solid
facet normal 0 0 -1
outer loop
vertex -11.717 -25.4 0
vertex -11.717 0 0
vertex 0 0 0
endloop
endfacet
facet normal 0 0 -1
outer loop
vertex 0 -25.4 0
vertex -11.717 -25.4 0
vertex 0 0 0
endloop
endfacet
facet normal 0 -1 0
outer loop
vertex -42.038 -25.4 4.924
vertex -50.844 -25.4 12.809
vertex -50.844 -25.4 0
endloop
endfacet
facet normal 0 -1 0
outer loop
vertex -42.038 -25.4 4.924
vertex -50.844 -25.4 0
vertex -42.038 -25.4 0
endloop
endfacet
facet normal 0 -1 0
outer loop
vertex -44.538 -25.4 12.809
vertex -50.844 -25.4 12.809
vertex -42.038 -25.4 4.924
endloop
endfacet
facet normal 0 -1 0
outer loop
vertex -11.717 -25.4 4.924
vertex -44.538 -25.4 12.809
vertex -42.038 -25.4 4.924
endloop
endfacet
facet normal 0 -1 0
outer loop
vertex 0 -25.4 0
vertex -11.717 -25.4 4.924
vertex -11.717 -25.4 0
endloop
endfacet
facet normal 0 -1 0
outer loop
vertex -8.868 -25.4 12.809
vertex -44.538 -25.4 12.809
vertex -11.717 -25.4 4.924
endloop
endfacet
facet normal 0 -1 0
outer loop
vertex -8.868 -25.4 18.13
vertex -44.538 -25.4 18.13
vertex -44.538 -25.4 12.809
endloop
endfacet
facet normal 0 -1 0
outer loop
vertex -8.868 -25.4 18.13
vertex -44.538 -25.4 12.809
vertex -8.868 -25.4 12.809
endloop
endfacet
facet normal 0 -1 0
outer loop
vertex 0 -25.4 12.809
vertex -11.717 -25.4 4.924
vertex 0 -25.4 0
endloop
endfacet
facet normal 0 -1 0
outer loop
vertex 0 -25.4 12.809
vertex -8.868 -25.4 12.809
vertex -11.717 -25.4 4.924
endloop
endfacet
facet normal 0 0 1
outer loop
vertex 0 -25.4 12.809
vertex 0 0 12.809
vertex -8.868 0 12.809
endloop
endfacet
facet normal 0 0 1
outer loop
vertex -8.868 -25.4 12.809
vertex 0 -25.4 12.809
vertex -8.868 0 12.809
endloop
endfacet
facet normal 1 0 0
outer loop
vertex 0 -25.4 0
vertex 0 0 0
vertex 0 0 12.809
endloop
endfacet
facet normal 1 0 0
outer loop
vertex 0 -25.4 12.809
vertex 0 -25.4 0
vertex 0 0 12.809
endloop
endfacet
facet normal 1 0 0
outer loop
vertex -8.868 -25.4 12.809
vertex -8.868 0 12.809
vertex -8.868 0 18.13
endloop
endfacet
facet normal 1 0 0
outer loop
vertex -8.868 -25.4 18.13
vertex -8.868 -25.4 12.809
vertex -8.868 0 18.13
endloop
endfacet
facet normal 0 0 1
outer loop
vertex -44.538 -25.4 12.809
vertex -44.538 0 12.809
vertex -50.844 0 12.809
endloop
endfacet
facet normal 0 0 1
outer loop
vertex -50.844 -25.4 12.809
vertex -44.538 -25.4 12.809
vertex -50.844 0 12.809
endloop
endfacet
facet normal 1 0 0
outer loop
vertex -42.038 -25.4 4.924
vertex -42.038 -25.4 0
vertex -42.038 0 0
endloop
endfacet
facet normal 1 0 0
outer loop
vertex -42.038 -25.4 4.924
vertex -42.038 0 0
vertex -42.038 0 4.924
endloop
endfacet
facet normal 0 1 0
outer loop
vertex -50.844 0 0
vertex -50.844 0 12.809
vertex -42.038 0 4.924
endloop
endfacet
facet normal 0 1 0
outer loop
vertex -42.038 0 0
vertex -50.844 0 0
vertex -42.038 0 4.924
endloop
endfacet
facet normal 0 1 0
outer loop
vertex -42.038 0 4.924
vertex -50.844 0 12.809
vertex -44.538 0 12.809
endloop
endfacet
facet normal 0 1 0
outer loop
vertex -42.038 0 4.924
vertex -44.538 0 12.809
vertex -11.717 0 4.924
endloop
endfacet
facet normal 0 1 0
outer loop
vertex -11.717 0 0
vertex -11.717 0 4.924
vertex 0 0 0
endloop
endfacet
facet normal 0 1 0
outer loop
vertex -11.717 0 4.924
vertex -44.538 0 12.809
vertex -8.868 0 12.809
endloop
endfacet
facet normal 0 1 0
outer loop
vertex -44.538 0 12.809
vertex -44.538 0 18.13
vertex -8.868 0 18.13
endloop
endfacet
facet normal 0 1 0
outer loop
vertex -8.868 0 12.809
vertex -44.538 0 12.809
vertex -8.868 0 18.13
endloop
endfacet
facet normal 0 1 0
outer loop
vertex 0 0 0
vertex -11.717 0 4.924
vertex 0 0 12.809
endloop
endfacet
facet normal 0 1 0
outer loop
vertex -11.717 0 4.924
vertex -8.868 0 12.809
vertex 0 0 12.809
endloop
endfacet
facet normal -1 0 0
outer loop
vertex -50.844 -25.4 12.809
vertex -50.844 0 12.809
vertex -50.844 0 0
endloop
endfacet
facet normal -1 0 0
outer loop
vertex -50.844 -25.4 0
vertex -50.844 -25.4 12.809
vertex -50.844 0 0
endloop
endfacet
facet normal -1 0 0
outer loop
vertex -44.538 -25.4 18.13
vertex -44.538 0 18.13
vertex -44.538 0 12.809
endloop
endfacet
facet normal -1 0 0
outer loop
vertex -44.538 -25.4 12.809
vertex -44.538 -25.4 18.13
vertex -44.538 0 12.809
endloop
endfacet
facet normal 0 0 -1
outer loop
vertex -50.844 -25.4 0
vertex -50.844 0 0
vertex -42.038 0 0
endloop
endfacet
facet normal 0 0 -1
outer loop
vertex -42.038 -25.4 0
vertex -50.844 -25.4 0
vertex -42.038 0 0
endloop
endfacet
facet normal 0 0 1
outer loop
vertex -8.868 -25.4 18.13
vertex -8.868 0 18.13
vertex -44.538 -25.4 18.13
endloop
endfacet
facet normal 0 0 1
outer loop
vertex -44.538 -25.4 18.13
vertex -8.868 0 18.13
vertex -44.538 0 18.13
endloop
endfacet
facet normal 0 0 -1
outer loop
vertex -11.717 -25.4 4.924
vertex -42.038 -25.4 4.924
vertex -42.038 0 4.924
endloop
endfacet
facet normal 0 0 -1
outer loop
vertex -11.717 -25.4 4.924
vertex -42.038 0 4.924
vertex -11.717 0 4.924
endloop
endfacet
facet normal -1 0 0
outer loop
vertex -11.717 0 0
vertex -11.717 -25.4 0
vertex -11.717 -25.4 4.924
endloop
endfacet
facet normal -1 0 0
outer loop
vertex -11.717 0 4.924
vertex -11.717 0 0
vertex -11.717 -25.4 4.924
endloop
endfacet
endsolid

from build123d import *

# Parameters (mm, degrees)
F1_DEPTH = 25.4
F2_W     = 30.321582
F2_H     = 4.924042
F3_DEPTH = 25.4


with BuildPart() as f1:
    # F0 (on Front) → F1 (new body)
    with BuildSketch(Plane.XZ):
        Polygon((-50.843794, 0), (0, 0), (0, 12.809483), (-8.868104, 12.809483), (-8.868104, 18.130345), (-44.537585, 18.130345), (-44.537585, 12.809483), (-50.843794, 12.809483), align=None)
    extrude(amount=F1_DEPTH)

    # F2 (on face) → F3 (cut)
    with BuildSketch(Plane.XZ.offset(25.4)):
        with Locations((-26.877471, 2.462021)):
            Rectangle(F2_W, F2_H)
    extrude(amount=-F3_DEPTH, mode=Mode.SUBTRACT)


solid = f1.part
